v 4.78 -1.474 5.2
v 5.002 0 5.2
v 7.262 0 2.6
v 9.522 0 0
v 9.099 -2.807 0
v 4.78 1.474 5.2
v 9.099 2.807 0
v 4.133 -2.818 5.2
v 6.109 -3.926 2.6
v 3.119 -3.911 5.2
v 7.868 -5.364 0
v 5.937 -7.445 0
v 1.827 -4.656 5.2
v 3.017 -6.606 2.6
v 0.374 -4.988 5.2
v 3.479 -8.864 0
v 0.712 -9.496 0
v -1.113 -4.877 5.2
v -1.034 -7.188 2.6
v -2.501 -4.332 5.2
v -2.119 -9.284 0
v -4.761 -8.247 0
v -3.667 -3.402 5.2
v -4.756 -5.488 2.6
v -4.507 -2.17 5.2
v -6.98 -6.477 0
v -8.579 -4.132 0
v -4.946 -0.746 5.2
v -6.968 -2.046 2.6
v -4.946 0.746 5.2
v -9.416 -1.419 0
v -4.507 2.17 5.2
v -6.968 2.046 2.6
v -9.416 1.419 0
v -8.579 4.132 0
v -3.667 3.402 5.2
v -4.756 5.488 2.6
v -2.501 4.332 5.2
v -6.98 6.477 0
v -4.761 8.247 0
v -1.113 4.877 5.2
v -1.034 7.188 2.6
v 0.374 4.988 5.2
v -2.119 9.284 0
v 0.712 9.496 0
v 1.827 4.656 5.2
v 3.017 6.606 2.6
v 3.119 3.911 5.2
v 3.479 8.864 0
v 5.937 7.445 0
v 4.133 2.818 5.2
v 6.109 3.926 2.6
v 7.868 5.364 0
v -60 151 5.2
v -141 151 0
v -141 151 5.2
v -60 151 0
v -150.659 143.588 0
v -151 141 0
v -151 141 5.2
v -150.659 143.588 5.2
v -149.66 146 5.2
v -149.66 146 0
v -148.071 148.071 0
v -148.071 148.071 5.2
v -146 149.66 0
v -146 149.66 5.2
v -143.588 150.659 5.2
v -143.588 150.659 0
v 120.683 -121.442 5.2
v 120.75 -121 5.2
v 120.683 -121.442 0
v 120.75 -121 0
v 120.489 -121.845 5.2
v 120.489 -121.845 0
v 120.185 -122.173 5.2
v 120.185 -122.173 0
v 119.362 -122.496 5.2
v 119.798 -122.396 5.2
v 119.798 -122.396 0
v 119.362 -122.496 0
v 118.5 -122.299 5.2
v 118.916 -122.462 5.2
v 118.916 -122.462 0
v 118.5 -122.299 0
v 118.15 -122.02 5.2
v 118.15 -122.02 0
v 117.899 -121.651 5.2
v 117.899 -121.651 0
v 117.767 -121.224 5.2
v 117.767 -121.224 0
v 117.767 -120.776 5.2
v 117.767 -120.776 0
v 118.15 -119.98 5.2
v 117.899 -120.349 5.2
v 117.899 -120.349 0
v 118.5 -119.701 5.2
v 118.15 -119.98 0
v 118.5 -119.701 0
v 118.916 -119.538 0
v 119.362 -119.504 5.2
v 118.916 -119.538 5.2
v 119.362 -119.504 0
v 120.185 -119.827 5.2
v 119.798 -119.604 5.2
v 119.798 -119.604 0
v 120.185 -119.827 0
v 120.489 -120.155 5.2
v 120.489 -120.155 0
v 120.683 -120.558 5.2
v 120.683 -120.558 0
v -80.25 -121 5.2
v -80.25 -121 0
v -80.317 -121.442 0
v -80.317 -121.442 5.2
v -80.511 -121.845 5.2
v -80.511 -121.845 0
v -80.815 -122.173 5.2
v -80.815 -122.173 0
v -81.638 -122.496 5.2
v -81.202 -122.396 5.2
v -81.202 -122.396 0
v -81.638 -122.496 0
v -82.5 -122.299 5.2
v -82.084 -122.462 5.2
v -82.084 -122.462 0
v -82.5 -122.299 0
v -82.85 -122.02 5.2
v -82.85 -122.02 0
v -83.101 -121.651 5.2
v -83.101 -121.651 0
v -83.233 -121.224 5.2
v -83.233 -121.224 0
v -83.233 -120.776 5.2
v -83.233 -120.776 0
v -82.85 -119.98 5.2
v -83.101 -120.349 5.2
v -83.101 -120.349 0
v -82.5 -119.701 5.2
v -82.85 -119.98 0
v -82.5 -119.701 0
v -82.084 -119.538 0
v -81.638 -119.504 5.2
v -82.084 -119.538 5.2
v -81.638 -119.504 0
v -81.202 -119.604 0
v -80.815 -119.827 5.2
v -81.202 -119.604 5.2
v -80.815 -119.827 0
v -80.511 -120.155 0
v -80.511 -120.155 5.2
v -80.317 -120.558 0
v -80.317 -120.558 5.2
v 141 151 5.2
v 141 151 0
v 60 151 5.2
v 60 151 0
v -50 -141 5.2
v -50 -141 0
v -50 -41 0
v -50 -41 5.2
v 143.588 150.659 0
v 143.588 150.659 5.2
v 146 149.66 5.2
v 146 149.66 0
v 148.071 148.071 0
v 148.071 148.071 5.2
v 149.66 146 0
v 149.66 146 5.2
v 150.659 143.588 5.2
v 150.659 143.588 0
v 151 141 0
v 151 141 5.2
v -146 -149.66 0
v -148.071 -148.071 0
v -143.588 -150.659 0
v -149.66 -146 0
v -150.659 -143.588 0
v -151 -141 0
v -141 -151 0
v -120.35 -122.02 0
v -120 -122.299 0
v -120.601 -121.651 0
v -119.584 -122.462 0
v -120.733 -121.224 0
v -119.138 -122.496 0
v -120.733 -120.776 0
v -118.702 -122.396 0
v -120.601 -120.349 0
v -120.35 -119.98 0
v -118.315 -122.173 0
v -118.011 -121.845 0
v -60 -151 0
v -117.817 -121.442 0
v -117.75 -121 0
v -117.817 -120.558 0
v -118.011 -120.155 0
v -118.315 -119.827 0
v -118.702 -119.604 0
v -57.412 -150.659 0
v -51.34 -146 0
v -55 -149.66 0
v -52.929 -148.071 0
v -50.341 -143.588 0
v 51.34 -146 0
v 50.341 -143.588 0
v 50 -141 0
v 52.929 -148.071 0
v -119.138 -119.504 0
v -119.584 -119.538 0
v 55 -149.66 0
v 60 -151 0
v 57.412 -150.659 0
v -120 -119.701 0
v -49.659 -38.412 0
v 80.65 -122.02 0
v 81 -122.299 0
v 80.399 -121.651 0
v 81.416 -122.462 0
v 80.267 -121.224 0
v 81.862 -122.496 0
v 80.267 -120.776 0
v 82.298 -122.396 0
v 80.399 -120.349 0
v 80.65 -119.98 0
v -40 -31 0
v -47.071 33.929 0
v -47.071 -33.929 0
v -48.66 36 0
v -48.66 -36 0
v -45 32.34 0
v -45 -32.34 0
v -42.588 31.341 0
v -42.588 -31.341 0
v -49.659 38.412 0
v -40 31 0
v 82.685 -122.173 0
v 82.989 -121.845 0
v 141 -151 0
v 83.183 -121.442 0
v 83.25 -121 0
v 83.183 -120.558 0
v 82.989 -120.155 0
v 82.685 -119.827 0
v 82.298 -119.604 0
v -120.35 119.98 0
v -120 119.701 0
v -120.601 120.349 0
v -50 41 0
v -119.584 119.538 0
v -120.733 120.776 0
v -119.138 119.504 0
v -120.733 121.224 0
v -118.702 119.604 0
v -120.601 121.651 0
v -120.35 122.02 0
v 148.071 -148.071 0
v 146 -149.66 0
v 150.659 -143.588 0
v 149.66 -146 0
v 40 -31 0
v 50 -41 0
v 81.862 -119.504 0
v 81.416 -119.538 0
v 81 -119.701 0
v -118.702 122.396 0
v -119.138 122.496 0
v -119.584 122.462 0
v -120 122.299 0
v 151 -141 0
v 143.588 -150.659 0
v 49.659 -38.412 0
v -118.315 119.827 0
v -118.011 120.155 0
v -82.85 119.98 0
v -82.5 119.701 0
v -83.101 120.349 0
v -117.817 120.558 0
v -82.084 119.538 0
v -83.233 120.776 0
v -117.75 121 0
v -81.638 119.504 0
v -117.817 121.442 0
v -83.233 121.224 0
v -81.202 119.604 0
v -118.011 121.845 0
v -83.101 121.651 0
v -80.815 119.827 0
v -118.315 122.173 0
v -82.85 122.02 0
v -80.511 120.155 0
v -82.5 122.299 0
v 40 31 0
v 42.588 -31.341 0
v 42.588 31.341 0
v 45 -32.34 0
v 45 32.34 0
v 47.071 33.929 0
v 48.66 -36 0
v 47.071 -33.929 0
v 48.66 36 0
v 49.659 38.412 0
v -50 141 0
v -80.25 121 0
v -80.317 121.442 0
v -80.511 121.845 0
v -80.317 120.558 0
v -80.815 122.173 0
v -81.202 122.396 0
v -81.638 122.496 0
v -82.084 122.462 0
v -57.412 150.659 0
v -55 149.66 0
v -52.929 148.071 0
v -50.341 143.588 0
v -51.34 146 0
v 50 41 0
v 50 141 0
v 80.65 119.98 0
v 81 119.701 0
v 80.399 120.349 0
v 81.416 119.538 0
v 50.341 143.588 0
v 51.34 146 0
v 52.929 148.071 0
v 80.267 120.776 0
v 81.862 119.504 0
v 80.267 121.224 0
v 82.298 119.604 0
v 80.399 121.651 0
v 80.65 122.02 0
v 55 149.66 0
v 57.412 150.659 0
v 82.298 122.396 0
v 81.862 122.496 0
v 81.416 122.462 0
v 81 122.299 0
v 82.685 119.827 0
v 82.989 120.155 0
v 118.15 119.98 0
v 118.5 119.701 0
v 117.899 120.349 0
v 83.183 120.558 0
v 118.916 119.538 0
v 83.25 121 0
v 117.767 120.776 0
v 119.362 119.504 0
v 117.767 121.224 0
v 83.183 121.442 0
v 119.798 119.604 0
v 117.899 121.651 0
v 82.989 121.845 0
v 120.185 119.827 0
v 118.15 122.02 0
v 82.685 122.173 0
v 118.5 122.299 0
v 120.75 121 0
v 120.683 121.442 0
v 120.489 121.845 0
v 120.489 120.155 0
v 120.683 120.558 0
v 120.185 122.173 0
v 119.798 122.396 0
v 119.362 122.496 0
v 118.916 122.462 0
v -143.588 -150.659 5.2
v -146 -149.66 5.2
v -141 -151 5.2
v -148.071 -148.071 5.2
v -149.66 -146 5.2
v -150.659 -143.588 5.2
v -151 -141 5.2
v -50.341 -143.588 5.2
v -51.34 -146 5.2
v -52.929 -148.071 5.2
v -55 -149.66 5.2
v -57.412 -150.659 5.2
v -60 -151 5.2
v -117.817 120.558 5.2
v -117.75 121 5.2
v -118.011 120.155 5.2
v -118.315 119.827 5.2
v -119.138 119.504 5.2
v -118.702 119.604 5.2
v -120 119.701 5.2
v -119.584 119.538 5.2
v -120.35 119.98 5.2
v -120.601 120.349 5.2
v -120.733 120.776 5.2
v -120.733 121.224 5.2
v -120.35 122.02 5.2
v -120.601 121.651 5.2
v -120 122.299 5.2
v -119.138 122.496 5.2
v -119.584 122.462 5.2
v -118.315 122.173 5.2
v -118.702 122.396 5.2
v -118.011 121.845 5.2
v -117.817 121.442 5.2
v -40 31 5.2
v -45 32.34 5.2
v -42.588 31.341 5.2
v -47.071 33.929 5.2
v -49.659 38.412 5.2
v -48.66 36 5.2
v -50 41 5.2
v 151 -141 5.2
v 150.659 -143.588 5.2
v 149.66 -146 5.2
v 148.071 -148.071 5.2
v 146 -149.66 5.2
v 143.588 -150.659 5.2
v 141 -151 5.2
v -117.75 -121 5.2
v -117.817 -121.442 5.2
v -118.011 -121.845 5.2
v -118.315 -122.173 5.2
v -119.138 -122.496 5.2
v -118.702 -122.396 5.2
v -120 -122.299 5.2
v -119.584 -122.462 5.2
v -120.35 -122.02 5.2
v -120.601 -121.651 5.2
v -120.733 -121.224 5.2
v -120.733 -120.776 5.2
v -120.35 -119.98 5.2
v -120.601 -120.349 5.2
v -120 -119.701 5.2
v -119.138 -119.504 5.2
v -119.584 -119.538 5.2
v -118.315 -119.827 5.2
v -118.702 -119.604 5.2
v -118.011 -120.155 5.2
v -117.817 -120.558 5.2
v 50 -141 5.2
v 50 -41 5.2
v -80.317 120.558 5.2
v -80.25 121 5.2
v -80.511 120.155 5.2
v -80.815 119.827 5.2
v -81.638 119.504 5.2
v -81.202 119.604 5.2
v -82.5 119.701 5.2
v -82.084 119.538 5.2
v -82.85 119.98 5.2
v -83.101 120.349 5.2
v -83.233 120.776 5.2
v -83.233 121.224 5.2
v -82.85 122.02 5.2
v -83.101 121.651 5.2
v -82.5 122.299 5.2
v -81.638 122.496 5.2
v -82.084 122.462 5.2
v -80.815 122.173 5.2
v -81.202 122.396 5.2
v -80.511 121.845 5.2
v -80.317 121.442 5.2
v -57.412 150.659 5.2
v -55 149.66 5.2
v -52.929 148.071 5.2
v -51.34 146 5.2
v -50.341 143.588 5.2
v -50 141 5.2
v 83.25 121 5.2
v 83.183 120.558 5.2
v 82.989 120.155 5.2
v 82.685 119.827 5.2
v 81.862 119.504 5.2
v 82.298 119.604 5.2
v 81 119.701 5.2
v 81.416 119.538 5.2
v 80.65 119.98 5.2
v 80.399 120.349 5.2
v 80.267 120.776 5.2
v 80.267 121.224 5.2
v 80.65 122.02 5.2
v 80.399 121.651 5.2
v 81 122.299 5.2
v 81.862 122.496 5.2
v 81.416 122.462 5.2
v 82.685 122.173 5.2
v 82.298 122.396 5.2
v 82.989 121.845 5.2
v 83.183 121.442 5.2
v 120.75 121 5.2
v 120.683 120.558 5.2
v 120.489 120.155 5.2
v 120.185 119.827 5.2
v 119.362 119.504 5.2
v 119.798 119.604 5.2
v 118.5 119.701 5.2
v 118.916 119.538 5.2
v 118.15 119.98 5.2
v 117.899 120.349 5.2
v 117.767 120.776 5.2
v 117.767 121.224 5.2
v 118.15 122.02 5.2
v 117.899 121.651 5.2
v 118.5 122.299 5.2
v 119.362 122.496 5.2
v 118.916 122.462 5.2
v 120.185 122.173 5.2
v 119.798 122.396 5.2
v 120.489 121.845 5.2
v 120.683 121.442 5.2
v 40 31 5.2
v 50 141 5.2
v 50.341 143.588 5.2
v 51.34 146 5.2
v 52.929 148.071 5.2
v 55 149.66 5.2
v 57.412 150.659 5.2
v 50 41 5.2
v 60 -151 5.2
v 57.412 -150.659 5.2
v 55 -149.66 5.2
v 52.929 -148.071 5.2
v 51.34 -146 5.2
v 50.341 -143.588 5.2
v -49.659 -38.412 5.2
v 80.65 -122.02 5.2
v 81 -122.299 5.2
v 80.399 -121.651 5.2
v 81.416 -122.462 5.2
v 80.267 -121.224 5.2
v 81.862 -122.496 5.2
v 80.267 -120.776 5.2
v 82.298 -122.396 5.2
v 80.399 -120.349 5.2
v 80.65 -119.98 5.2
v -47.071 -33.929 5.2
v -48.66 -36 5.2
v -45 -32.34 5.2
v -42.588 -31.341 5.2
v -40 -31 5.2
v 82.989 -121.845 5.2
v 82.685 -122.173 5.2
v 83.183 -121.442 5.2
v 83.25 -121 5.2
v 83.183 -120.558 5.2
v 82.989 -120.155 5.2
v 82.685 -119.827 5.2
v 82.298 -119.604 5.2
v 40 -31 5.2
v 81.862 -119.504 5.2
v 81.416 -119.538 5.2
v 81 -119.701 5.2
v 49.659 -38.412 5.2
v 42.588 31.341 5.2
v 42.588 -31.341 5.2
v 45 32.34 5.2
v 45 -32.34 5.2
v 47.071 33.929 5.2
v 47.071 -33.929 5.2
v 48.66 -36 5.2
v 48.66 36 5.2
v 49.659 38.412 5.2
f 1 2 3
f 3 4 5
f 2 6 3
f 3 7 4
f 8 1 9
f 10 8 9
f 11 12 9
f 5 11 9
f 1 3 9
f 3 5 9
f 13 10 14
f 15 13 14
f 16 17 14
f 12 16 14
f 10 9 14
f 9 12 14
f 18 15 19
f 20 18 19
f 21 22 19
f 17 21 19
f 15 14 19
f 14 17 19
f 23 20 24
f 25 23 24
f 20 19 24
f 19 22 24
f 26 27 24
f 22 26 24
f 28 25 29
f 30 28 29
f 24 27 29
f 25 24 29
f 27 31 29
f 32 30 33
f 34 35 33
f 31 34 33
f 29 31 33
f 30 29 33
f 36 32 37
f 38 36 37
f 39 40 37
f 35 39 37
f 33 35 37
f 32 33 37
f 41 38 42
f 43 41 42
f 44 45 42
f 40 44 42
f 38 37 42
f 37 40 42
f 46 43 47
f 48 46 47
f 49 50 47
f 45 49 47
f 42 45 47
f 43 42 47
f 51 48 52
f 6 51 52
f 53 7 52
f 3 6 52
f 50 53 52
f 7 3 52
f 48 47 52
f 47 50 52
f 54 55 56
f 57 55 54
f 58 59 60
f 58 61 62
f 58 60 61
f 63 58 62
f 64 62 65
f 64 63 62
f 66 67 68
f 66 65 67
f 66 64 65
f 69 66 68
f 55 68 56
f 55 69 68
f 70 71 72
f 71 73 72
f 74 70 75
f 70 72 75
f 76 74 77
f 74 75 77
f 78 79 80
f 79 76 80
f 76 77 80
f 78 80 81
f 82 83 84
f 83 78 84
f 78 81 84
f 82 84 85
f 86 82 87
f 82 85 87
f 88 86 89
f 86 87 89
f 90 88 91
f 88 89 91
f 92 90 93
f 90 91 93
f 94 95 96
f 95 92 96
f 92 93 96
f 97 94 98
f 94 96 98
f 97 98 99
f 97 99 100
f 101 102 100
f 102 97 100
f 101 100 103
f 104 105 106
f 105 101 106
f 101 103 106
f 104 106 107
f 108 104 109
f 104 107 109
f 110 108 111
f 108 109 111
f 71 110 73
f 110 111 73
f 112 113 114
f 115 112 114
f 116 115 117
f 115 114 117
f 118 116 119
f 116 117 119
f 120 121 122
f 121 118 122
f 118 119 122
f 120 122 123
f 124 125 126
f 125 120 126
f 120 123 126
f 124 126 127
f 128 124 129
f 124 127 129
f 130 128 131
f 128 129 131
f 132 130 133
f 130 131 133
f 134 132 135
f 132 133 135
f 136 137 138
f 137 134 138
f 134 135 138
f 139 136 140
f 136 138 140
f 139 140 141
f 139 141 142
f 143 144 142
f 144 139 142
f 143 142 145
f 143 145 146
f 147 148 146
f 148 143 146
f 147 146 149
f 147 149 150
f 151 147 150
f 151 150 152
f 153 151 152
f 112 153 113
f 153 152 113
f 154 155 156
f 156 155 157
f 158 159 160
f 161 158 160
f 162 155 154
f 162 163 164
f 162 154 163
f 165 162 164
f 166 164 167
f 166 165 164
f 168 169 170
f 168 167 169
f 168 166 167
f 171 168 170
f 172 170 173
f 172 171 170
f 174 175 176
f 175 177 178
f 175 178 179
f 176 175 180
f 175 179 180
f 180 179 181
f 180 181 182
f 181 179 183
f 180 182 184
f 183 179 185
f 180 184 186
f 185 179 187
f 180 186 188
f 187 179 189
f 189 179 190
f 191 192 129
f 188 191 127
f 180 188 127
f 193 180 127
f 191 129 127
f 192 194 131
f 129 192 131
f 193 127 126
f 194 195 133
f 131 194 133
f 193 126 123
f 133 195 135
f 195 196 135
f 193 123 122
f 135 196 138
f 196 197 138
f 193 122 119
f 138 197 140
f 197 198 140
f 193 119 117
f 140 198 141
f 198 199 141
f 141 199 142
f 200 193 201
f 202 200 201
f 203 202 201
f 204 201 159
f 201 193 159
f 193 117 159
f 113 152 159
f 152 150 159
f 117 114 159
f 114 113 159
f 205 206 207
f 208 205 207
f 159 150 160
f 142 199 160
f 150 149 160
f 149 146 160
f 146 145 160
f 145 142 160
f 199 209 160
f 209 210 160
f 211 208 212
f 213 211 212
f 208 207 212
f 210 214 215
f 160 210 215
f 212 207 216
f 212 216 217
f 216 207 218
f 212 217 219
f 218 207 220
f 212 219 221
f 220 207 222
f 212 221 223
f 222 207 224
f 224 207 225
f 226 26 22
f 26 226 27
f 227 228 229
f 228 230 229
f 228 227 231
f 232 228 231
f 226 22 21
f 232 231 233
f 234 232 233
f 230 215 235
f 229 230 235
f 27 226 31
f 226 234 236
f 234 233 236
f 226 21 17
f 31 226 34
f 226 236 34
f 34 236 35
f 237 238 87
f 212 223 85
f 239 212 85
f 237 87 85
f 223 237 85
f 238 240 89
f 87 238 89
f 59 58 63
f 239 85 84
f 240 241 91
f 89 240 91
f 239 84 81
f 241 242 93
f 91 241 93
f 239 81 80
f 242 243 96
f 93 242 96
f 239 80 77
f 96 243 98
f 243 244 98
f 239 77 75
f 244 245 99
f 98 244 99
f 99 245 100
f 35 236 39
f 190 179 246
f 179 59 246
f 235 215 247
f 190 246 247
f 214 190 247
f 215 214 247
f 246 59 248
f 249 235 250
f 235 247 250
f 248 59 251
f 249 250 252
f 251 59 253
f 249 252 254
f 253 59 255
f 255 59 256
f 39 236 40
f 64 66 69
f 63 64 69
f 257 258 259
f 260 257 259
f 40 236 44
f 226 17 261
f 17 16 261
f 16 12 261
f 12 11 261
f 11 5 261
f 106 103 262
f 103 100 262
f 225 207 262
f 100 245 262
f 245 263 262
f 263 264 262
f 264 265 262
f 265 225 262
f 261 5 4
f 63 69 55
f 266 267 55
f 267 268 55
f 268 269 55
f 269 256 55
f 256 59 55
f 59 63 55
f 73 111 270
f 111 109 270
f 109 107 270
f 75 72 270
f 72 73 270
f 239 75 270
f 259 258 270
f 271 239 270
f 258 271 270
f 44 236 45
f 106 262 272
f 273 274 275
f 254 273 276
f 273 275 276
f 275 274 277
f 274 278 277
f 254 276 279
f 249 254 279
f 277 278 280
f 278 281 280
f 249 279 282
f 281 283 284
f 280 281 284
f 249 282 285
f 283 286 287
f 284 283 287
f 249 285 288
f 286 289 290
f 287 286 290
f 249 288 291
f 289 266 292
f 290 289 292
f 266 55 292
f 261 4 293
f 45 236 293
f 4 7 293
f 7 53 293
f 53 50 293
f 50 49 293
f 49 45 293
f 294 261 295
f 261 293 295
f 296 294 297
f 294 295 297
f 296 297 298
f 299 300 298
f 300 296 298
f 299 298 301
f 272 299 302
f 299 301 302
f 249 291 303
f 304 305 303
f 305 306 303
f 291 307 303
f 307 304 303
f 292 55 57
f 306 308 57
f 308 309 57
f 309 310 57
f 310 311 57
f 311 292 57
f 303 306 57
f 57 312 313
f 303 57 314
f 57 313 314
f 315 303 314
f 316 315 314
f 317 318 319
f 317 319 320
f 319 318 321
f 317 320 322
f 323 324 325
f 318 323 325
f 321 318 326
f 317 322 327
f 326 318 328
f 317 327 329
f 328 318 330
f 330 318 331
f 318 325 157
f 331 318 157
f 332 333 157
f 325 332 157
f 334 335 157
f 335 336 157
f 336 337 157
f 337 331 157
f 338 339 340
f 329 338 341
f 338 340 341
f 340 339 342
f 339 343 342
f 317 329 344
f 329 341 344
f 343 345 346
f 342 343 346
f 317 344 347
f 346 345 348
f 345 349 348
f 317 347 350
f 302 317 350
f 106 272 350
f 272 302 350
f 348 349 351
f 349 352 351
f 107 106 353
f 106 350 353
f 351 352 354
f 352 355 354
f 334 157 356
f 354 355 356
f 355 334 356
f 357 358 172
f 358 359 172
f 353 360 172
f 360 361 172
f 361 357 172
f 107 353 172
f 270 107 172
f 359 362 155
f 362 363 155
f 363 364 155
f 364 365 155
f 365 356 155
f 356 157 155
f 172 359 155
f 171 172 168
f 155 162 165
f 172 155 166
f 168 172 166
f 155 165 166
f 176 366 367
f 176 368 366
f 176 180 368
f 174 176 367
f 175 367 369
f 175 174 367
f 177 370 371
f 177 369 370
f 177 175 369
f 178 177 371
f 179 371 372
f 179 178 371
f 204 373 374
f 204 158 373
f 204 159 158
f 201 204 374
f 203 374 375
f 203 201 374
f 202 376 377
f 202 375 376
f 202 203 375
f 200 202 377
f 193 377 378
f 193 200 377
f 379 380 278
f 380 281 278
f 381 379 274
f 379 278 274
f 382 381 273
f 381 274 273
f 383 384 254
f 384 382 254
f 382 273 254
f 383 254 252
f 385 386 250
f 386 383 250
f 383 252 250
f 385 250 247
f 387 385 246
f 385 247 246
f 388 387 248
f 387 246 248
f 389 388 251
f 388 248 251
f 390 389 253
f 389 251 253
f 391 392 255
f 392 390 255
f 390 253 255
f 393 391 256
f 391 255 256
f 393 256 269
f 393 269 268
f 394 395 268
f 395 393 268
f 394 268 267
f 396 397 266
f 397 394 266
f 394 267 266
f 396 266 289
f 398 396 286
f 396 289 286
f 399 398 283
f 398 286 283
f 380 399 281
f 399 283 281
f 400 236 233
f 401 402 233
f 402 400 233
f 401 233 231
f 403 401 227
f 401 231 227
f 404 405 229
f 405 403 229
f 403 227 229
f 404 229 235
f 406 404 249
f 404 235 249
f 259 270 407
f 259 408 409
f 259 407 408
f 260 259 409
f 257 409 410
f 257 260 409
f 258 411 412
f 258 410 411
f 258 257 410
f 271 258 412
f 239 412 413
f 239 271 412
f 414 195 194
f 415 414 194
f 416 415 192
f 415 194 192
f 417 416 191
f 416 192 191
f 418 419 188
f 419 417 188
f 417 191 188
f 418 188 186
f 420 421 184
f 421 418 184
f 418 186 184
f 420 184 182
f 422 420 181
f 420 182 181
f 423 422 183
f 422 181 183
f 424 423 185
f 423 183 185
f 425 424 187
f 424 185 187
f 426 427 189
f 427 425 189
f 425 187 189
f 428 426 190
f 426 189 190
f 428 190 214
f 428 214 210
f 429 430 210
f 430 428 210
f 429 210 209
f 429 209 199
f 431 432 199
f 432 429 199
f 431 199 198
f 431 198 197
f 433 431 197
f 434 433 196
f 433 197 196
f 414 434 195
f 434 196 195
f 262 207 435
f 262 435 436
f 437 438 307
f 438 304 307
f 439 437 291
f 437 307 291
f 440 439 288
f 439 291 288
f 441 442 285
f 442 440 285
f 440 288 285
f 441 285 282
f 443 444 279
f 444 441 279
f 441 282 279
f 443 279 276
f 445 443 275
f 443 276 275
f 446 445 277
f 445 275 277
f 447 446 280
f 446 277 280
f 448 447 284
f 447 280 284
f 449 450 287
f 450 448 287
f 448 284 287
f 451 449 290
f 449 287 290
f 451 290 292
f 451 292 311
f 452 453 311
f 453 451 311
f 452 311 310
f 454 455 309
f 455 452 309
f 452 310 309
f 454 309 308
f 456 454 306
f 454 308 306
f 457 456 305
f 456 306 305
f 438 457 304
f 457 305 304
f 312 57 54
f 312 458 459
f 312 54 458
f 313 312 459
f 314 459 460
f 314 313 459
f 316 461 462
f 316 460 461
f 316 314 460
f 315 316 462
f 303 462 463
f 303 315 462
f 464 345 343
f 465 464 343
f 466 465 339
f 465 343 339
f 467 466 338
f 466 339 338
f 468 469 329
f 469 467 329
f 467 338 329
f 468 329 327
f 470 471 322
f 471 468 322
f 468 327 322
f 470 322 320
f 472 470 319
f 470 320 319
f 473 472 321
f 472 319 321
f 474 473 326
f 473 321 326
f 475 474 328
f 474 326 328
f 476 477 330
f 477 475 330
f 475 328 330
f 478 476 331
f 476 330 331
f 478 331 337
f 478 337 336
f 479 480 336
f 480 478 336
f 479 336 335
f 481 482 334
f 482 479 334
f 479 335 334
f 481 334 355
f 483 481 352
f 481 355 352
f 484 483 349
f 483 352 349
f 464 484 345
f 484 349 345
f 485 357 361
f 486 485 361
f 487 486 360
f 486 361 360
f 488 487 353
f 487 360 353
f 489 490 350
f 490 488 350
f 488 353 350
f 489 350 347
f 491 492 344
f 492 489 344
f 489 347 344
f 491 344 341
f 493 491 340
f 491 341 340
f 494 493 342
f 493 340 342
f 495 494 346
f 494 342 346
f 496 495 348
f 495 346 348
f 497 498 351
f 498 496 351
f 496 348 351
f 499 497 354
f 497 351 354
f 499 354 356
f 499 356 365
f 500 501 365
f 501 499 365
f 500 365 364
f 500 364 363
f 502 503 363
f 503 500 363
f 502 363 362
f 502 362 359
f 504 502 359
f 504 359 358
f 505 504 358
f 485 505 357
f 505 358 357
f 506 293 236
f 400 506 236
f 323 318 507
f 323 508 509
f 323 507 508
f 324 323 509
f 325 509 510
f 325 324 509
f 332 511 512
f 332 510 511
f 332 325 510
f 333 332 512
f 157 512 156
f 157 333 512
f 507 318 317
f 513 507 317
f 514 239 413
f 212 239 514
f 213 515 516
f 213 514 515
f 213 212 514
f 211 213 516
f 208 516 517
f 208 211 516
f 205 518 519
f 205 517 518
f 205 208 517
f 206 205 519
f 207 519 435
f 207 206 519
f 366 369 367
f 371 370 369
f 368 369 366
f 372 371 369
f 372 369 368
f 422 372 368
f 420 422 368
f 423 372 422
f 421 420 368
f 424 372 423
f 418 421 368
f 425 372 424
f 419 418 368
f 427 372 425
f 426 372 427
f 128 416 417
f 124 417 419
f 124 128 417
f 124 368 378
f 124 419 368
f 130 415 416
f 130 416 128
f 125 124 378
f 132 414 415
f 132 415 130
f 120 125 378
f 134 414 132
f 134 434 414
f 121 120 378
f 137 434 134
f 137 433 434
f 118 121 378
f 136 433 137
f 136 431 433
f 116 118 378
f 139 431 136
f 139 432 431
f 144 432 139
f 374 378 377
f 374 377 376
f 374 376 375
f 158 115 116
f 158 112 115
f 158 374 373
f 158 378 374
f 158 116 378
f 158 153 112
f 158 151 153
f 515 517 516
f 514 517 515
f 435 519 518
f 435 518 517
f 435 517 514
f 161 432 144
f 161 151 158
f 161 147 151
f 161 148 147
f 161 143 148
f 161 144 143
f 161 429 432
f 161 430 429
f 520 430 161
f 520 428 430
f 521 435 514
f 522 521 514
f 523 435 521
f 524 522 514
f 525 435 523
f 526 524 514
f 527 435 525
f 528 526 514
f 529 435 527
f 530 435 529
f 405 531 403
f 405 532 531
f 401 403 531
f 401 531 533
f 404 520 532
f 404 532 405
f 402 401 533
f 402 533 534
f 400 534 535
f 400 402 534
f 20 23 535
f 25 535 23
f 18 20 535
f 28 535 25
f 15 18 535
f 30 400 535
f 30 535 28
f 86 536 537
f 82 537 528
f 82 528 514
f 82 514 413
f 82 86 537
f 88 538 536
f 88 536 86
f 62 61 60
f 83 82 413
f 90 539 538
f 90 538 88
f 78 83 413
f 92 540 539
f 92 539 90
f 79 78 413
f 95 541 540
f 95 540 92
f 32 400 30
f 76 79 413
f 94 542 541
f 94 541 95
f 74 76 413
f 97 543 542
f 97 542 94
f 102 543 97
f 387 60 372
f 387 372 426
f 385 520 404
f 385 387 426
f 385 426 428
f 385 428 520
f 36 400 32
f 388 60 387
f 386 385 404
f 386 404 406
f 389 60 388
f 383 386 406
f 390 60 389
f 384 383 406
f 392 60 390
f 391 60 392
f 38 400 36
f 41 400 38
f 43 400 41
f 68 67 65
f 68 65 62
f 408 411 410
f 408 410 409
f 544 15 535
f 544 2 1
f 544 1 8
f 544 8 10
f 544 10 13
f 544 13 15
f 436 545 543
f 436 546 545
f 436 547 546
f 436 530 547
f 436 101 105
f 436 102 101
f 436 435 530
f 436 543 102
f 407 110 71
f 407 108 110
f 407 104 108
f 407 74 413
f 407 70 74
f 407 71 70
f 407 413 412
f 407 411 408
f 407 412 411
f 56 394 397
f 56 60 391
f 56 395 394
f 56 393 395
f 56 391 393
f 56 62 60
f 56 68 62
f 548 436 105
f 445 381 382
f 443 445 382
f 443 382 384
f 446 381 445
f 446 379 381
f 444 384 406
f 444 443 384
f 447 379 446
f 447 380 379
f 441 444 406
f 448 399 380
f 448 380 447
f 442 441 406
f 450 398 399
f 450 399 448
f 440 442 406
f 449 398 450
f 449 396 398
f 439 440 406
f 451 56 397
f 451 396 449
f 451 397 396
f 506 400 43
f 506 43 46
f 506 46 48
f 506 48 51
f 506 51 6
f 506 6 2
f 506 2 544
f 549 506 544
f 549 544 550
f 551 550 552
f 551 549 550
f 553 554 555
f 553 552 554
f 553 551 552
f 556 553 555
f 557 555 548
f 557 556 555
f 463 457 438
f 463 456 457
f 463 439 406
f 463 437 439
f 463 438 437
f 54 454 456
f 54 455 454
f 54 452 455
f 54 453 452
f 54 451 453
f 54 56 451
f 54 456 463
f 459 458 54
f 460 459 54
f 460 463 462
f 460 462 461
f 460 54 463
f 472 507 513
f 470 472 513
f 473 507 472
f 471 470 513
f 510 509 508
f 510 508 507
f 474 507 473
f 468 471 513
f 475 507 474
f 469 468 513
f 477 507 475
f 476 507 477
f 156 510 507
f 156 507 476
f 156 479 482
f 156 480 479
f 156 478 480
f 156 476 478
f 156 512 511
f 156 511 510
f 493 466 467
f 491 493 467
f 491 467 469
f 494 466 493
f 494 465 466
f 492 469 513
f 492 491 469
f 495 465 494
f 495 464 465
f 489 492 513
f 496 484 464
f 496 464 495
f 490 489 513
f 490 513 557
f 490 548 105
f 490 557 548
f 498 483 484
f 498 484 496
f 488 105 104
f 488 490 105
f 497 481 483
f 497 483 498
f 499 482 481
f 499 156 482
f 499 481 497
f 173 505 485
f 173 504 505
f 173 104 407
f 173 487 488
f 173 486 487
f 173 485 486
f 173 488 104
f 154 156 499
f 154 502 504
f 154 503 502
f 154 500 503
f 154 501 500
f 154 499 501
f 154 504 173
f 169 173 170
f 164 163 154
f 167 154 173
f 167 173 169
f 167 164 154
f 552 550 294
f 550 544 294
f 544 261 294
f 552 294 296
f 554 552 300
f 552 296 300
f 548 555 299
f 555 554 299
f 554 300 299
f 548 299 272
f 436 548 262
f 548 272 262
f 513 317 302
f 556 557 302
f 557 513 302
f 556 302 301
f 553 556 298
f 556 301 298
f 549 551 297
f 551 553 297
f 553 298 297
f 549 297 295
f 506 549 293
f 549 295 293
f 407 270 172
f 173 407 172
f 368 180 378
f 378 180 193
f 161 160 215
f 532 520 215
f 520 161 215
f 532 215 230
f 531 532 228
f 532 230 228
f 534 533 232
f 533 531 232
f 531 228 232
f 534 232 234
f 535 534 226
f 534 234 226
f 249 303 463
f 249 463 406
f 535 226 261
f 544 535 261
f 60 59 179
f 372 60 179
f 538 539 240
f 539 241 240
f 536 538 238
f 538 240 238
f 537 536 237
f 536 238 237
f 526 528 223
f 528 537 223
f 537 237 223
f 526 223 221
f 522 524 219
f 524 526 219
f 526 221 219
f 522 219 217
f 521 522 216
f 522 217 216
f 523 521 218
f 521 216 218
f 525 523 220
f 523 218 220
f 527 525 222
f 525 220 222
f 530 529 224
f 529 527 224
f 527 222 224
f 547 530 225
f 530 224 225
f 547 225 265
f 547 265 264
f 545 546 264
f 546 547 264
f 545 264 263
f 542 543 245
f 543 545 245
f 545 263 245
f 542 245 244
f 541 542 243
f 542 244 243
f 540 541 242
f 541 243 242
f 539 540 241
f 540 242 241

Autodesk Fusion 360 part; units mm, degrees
sketch "Sketch1" plane through (0, 0, 0) normal (0, 0, 1) x (1, 0, 0)
  line L0 (40, 31) -> (-40, 31)
  line L1 (-40, -31) -> (40, -31)
  line L2 (50, 31) -> (-50, -31) construction
  line L3 (-50, 31) -> (50, -31) construction
  line L4 (151, 31) -> (151, 141)
  line L5 (141, 151) -> (60, 151)
  line L6 (50, 141) -> (50, 41)
  line L7 (151, -31) -> (151, -141)
  line L8 (141, -151) -> (60, -151)
  line L9 (50, -141) -> (50, -41)
  line L10 (151, -31) -> (151, 31)
  line L11 (0, 0) -> (0, 31) construction
  line L12 (-141, 151) -> (-60, 151)
  line L13 (-50, 141) -> (-50, 41)
  line L14 (-151, 31) -> (-151, 141)
  line L15 (-151, -31) -> (-151, 31)
  line L16 (-141, -151) -> (-60, -151)
  line L17 (-50, -141) -> (-50, -41)
  line L18 (-151, -31) -> (-151, -141)
  circle A0 centre (0, 0) radius 5
  arc A1 (-141, 151) -> (-151, 141) centre (-141, 141) ccw
  arc A2 (-50, 141) -> (-60, 151) centre (-60, 141) ccw
  arc A3 (60, 151) -> (50, 141) centre (60, 141) ccw
  arc A4 (151, 141) -> (141, 151) centre (141, 141) ccw
  arc A5 (-151, -141) -> (-141, -151) centre (-141, -141) ccw
  arc A6 (-60, -151) -> (-50, -141) centre (-60, -141) ccw
  arc A7 (50, -141) -> (60, -151) centre (60, -141) ccw
  arc A8 (141, -151) -> (151, -141) centre (141, -141) ccw
  arc A9 (-40, -31) -> (-50, -41) centre (-40, -41) ccw
  arc A10 (50, -41) -> (40, -31) centre (40, -41) ccw
  arc A11 (40, 31) -> (50, 41) centre (40, 41) ccw
  arc A12 (-50, 41) -> (-40, 31) centre (-40, 41) ccw
  line L19 (100.5, -151) -> (100.5, -121) construction
  line L20 (119.25, -121) -> (81.75, -121) construction
  circle A13 centre (119.25, -121) radius 1.5
  circle A14 centre (81.75, -121) radius 1.5
  line L21 (151, 0) -> (100, 0) construction
  circle A15 centre (81.75, 121) radius 1.5
  circle A16 centre (119.25, 121) radius 1.5
  line L22 (0, -150) -> (0, -125) construction
  circle A17 centre (-81.75, -121) radius 1.5
  circle A18 centre (-119.25, -121) radius 1.5
  circle A19 centre (-81.75, 121) radius 1.5
  circle A20 centre (-119.25, 121) radius 1.5
  point P0 (50, 151)
  point P1 (50, -151)
  dimension "d1" = 100
  dimension "d2" = 62
  dimension "d3" = 101
  dimension "d4" = 120
  dimension "d5" = 101
  dimension "d6" = 120
  dimension "d9" = 10
  dimension "d10" = 10
  dimension "d11" = 30
  dimension "d12" = 18.75
  dimension "d13" = 37.5
  dimension "d14" = 3
  dimension "d15" = 3
  dimension "d21" = 51
  dimension "d22" = 25
  dimension "d23" = 125
extrude "Extrude1" add sketch "Sketch1" along normal blind 30.6
chamfer "Chamfer1" distance 5.2024 angle 41 1 edges at (-4.6616, 1.8081, 0) measured on face at (4.9938, -0.2492, 20.4)
extrude "Extrude2" cut 1 faces at (-96.5316, 12.7276, 30.6) along direction (0, 0, -1) blind 25.4
equation "d7 = 5.2 mm + 1 in"
equation "d12 = ( 37.5 / 2 ) * 1 mm"
